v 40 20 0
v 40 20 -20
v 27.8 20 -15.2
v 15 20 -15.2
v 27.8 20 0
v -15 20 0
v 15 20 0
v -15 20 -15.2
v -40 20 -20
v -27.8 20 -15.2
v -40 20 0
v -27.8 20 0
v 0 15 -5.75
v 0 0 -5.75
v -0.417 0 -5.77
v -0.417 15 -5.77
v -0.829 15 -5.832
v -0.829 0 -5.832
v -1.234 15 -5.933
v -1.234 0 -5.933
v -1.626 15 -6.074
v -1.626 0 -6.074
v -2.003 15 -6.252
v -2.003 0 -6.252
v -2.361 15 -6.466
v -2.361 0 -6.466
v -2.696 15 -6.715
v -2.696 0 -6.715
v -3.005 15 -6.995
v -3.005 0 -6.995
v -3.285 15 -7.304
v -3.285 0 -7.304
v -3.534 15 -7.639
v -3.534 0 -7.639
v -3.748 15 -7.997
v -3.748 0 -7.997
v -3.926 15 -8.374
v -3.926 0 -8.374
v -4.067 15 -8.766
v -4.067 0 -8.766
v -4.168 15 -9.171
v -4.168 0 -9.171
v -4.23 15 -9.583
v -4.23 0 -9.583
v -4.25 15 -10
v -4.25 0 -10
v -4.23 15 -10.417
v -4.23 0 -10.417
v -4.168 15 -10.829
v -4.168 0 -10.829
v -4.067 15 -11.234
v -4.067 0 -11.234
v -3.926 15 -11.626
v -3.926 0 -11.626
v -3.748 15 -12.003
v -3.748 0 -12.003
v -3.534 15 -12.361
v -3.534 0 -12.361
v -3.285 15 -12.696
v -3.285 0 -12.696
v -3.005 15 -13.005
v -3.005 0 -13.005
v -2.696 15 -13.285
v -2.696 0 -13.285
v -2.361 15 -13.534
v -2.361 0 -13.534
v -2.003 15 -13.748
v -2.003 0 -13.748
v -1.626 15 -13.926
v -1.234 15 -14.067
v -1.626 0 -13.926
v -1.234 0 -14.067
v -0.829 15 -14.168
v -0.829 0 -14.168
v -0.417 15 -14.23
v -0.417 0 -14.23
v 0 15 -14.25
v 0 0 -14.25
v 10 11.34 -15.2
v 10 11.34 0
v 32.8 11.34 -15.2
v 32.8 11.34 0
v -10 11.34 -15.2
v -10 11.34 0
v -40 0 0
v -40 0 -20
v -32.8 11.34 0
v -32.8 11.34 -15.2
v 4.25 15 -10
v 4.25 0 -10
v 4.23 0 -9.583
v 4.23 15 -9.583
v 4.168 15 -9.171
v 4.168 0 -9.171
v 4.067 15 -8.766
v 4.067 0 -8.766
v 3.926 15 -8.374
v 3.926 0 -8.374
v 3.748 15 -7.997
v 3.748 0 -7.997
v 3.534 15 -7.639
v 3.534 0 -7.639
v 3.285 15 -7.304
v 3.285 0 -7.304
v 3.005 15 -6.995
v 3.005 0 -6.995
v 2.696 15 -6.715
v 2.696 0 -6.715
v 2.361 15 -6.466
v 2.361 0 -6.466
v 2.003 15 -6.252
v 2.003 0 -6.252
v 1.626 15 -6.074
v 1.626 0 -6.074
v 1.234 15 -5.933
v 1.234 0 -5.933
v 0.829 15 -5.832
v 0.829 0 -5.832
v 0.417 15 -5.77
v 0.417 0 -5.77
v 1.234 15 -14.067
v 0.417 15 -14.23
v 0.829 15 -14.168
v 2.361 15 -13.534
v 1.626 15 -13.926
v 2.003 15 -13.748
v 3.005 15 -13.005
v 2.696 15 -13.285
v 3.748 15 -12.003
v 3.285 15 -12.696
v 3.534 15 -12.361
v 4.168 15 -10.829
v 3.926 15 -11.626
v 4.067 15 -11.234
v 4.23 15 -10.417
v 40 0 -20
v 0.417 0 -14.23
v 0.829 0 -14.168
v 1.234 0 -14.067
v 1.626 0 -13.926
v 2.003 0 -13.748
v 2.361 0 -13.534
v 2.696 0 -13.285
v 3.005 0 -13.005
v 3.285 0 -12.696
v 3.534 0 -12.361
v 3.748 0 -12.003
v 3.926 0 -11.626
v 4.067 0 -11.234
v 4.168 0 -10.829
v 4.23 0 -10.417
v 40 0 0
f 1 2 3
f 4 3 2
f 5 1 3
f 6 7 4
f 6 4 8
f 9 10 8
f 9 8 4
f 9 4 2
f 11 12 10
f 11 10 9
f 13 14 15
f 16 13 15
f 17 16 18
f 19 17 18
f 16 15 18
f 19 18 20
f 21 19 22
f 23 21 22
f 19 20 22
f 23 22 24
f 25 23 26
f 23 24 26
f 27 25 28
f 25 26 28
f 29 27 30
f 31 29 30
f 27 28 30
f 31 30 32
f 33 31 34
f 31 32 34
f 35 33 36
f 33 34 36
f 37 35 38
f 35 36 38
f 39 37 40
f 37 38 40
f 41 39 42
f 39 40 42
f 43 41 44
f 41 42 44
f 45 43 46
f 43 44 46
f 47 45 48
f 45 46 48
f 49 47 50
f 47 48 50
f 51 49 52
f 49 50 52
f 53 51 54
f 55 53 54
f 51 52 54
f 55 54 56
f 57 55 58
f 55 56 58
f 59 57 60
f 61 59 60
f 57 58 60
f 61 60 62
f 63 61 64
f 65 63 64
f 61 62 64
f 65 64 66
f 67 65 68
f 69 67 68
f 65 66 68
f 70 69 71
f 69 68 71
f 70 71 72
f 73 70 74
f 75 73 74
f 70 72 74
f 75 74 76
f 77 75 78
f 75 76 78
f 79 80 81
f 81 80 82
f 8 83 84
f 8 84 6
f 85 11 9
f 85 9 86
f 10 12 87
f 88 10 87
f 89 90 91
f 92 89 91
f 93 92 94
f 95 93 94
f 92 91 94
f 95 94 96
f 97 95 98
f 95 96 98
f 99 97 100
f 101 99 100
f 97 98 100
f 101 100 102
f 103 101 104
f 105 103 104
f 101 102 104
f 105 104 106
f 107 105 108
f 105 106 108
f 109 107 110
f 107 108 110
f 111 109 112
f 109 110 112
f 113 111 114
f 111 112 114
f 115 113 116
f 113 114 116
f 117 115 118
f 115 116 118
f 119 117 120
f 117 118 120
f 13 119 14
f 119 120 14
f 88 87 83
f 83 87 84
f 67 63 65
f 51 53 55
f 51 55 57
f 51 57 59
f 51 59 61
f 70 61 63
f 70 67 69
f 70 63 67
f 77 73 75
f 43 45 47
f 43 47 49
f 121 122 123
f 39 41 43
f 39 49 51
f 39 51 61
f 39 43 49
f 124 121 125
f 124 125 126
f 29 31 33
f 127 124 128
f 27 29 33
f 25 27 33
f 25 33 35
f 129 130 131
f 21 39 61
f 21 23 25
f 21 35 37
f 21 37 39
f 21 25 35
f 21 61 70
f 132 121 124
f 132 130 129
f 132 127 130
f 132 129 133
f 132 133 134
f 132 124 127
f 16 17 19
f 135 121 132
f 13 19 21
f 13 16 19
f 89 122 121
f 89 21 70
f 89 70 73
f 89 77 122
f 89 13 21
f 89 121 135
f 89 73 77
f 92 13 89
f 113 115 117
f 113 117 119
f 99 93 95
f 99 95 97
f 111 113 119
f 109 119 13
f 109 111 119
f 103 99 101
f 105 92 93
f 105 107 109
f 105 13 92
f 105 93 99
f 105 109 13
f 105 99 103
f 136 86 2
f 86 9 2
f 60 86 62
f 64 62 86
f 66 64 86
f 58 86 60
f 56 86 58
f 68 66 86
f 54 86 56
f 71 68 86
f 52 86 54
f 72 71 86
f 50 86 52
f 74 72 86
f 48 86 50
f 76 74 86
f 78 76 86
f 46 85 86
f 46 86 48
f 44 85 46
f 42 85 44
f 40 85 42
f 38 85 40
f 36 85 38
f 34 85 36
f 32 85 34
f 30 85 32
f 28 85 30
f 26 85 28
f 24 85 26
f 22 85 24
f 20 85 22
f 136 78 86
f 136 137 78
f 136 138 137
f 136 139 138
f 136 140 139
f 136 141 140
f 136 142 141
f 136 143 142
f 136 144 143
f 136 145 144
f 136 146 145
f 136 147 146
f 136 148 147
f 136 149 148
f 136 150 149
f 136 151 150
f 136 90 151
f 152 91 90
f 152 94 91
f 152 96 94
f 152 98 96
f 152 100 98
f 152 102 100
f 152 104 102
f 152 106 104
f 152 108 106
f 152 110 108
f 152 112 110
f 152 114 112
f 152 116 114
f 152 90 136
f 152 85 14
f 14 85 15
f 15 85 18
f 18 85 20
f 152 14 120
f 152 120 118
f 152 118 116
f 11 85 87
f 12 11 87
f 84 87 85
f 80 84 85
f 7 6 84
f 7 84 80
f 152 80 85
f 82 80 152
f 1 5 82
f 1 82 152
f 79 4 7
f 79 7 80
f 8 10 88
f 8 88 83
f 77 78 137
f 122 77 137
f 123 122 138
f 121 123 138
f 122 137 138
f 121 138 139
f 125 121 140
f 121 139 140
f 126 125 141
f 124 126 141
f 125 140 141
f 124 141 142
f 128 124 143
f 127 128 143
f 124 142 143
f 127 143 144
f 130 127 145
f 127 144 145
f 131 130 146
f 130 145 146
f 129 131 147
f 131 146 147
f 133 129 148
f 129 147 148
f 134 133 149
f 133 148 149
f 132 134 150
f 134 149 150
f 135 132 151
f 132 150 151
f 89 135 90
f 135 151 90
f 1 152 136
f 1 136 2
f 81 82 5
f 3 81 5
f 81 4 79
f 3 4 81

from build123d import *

# Parameters (mm, degrees)
F1_DEPTH = 20
F2_DEPTH = 15.2
F4_DEPTH = 15


with BuildPart() as f1:
    # F0 (on Top) → F1 (new body)
    with BuildSketch(Plane.XY):
        Polygon((-40, 0), (0, 0), (0, 20), (-15, 20), (-10, 11.339746), (-32.8, 11.339746), (-27.8, 20), (-40, 20), align=None)
        Polygon((0, 20), (0, 0), (40, 0), (40, 20), (27.8, 20), (32.8, 11.339746), (10, 11.339746), (15, 20), align=None)
        Polygon((-10, 11.339746), (-15, 20), (-27.8, 20), (-32.8, 11.339746), align=None)
        Polygon((27.8, 20), (15, 20), (10, 11.339746), (32.8, 11.339746), align=None)
    extrude(amount=-F1_DEPTH)

    # F0 (on Top) → F2 (cut)
    with BuildSketch(Plane.XY):
        Polygon((-10, 11.339746), (-15, 20), (-27.8, 20), (-32.8, 11.339746), align=None)
        Polygon((27.8, 20), (15, 20), (10, 11.339746), (32.8, 11.339746), align=None)
    extrude(amount=-F2_DEPTH, mode=Mode.SUBTRACT)

    # F3 (on face) → F4 (cut)
    with BuildSketch(Plane.XZ):
        with BuildLine():
            ThreePointArc((4.25, -10), (3.005204, -6.994796), (0, -5.75))
            Line((0, -5.75), (0, -10))
            Line((0, -10), (0, -14.25))
            ThreePointArc((0, -14.25), (3.005204, -13.005204), (4.25, -10))
        make_face()
        with BuildLine():
            Line((0, -10), (0, -5.75))
            ThreePointArc((0, -5.75), (-4.25, -10), (0, -14.25))
            Line((0, -14.25), (0, -10))
        make_face()
    extrude(amount=-F4_DEPTH, mode=Mode.SUBTRACT)


solid = f1.part
